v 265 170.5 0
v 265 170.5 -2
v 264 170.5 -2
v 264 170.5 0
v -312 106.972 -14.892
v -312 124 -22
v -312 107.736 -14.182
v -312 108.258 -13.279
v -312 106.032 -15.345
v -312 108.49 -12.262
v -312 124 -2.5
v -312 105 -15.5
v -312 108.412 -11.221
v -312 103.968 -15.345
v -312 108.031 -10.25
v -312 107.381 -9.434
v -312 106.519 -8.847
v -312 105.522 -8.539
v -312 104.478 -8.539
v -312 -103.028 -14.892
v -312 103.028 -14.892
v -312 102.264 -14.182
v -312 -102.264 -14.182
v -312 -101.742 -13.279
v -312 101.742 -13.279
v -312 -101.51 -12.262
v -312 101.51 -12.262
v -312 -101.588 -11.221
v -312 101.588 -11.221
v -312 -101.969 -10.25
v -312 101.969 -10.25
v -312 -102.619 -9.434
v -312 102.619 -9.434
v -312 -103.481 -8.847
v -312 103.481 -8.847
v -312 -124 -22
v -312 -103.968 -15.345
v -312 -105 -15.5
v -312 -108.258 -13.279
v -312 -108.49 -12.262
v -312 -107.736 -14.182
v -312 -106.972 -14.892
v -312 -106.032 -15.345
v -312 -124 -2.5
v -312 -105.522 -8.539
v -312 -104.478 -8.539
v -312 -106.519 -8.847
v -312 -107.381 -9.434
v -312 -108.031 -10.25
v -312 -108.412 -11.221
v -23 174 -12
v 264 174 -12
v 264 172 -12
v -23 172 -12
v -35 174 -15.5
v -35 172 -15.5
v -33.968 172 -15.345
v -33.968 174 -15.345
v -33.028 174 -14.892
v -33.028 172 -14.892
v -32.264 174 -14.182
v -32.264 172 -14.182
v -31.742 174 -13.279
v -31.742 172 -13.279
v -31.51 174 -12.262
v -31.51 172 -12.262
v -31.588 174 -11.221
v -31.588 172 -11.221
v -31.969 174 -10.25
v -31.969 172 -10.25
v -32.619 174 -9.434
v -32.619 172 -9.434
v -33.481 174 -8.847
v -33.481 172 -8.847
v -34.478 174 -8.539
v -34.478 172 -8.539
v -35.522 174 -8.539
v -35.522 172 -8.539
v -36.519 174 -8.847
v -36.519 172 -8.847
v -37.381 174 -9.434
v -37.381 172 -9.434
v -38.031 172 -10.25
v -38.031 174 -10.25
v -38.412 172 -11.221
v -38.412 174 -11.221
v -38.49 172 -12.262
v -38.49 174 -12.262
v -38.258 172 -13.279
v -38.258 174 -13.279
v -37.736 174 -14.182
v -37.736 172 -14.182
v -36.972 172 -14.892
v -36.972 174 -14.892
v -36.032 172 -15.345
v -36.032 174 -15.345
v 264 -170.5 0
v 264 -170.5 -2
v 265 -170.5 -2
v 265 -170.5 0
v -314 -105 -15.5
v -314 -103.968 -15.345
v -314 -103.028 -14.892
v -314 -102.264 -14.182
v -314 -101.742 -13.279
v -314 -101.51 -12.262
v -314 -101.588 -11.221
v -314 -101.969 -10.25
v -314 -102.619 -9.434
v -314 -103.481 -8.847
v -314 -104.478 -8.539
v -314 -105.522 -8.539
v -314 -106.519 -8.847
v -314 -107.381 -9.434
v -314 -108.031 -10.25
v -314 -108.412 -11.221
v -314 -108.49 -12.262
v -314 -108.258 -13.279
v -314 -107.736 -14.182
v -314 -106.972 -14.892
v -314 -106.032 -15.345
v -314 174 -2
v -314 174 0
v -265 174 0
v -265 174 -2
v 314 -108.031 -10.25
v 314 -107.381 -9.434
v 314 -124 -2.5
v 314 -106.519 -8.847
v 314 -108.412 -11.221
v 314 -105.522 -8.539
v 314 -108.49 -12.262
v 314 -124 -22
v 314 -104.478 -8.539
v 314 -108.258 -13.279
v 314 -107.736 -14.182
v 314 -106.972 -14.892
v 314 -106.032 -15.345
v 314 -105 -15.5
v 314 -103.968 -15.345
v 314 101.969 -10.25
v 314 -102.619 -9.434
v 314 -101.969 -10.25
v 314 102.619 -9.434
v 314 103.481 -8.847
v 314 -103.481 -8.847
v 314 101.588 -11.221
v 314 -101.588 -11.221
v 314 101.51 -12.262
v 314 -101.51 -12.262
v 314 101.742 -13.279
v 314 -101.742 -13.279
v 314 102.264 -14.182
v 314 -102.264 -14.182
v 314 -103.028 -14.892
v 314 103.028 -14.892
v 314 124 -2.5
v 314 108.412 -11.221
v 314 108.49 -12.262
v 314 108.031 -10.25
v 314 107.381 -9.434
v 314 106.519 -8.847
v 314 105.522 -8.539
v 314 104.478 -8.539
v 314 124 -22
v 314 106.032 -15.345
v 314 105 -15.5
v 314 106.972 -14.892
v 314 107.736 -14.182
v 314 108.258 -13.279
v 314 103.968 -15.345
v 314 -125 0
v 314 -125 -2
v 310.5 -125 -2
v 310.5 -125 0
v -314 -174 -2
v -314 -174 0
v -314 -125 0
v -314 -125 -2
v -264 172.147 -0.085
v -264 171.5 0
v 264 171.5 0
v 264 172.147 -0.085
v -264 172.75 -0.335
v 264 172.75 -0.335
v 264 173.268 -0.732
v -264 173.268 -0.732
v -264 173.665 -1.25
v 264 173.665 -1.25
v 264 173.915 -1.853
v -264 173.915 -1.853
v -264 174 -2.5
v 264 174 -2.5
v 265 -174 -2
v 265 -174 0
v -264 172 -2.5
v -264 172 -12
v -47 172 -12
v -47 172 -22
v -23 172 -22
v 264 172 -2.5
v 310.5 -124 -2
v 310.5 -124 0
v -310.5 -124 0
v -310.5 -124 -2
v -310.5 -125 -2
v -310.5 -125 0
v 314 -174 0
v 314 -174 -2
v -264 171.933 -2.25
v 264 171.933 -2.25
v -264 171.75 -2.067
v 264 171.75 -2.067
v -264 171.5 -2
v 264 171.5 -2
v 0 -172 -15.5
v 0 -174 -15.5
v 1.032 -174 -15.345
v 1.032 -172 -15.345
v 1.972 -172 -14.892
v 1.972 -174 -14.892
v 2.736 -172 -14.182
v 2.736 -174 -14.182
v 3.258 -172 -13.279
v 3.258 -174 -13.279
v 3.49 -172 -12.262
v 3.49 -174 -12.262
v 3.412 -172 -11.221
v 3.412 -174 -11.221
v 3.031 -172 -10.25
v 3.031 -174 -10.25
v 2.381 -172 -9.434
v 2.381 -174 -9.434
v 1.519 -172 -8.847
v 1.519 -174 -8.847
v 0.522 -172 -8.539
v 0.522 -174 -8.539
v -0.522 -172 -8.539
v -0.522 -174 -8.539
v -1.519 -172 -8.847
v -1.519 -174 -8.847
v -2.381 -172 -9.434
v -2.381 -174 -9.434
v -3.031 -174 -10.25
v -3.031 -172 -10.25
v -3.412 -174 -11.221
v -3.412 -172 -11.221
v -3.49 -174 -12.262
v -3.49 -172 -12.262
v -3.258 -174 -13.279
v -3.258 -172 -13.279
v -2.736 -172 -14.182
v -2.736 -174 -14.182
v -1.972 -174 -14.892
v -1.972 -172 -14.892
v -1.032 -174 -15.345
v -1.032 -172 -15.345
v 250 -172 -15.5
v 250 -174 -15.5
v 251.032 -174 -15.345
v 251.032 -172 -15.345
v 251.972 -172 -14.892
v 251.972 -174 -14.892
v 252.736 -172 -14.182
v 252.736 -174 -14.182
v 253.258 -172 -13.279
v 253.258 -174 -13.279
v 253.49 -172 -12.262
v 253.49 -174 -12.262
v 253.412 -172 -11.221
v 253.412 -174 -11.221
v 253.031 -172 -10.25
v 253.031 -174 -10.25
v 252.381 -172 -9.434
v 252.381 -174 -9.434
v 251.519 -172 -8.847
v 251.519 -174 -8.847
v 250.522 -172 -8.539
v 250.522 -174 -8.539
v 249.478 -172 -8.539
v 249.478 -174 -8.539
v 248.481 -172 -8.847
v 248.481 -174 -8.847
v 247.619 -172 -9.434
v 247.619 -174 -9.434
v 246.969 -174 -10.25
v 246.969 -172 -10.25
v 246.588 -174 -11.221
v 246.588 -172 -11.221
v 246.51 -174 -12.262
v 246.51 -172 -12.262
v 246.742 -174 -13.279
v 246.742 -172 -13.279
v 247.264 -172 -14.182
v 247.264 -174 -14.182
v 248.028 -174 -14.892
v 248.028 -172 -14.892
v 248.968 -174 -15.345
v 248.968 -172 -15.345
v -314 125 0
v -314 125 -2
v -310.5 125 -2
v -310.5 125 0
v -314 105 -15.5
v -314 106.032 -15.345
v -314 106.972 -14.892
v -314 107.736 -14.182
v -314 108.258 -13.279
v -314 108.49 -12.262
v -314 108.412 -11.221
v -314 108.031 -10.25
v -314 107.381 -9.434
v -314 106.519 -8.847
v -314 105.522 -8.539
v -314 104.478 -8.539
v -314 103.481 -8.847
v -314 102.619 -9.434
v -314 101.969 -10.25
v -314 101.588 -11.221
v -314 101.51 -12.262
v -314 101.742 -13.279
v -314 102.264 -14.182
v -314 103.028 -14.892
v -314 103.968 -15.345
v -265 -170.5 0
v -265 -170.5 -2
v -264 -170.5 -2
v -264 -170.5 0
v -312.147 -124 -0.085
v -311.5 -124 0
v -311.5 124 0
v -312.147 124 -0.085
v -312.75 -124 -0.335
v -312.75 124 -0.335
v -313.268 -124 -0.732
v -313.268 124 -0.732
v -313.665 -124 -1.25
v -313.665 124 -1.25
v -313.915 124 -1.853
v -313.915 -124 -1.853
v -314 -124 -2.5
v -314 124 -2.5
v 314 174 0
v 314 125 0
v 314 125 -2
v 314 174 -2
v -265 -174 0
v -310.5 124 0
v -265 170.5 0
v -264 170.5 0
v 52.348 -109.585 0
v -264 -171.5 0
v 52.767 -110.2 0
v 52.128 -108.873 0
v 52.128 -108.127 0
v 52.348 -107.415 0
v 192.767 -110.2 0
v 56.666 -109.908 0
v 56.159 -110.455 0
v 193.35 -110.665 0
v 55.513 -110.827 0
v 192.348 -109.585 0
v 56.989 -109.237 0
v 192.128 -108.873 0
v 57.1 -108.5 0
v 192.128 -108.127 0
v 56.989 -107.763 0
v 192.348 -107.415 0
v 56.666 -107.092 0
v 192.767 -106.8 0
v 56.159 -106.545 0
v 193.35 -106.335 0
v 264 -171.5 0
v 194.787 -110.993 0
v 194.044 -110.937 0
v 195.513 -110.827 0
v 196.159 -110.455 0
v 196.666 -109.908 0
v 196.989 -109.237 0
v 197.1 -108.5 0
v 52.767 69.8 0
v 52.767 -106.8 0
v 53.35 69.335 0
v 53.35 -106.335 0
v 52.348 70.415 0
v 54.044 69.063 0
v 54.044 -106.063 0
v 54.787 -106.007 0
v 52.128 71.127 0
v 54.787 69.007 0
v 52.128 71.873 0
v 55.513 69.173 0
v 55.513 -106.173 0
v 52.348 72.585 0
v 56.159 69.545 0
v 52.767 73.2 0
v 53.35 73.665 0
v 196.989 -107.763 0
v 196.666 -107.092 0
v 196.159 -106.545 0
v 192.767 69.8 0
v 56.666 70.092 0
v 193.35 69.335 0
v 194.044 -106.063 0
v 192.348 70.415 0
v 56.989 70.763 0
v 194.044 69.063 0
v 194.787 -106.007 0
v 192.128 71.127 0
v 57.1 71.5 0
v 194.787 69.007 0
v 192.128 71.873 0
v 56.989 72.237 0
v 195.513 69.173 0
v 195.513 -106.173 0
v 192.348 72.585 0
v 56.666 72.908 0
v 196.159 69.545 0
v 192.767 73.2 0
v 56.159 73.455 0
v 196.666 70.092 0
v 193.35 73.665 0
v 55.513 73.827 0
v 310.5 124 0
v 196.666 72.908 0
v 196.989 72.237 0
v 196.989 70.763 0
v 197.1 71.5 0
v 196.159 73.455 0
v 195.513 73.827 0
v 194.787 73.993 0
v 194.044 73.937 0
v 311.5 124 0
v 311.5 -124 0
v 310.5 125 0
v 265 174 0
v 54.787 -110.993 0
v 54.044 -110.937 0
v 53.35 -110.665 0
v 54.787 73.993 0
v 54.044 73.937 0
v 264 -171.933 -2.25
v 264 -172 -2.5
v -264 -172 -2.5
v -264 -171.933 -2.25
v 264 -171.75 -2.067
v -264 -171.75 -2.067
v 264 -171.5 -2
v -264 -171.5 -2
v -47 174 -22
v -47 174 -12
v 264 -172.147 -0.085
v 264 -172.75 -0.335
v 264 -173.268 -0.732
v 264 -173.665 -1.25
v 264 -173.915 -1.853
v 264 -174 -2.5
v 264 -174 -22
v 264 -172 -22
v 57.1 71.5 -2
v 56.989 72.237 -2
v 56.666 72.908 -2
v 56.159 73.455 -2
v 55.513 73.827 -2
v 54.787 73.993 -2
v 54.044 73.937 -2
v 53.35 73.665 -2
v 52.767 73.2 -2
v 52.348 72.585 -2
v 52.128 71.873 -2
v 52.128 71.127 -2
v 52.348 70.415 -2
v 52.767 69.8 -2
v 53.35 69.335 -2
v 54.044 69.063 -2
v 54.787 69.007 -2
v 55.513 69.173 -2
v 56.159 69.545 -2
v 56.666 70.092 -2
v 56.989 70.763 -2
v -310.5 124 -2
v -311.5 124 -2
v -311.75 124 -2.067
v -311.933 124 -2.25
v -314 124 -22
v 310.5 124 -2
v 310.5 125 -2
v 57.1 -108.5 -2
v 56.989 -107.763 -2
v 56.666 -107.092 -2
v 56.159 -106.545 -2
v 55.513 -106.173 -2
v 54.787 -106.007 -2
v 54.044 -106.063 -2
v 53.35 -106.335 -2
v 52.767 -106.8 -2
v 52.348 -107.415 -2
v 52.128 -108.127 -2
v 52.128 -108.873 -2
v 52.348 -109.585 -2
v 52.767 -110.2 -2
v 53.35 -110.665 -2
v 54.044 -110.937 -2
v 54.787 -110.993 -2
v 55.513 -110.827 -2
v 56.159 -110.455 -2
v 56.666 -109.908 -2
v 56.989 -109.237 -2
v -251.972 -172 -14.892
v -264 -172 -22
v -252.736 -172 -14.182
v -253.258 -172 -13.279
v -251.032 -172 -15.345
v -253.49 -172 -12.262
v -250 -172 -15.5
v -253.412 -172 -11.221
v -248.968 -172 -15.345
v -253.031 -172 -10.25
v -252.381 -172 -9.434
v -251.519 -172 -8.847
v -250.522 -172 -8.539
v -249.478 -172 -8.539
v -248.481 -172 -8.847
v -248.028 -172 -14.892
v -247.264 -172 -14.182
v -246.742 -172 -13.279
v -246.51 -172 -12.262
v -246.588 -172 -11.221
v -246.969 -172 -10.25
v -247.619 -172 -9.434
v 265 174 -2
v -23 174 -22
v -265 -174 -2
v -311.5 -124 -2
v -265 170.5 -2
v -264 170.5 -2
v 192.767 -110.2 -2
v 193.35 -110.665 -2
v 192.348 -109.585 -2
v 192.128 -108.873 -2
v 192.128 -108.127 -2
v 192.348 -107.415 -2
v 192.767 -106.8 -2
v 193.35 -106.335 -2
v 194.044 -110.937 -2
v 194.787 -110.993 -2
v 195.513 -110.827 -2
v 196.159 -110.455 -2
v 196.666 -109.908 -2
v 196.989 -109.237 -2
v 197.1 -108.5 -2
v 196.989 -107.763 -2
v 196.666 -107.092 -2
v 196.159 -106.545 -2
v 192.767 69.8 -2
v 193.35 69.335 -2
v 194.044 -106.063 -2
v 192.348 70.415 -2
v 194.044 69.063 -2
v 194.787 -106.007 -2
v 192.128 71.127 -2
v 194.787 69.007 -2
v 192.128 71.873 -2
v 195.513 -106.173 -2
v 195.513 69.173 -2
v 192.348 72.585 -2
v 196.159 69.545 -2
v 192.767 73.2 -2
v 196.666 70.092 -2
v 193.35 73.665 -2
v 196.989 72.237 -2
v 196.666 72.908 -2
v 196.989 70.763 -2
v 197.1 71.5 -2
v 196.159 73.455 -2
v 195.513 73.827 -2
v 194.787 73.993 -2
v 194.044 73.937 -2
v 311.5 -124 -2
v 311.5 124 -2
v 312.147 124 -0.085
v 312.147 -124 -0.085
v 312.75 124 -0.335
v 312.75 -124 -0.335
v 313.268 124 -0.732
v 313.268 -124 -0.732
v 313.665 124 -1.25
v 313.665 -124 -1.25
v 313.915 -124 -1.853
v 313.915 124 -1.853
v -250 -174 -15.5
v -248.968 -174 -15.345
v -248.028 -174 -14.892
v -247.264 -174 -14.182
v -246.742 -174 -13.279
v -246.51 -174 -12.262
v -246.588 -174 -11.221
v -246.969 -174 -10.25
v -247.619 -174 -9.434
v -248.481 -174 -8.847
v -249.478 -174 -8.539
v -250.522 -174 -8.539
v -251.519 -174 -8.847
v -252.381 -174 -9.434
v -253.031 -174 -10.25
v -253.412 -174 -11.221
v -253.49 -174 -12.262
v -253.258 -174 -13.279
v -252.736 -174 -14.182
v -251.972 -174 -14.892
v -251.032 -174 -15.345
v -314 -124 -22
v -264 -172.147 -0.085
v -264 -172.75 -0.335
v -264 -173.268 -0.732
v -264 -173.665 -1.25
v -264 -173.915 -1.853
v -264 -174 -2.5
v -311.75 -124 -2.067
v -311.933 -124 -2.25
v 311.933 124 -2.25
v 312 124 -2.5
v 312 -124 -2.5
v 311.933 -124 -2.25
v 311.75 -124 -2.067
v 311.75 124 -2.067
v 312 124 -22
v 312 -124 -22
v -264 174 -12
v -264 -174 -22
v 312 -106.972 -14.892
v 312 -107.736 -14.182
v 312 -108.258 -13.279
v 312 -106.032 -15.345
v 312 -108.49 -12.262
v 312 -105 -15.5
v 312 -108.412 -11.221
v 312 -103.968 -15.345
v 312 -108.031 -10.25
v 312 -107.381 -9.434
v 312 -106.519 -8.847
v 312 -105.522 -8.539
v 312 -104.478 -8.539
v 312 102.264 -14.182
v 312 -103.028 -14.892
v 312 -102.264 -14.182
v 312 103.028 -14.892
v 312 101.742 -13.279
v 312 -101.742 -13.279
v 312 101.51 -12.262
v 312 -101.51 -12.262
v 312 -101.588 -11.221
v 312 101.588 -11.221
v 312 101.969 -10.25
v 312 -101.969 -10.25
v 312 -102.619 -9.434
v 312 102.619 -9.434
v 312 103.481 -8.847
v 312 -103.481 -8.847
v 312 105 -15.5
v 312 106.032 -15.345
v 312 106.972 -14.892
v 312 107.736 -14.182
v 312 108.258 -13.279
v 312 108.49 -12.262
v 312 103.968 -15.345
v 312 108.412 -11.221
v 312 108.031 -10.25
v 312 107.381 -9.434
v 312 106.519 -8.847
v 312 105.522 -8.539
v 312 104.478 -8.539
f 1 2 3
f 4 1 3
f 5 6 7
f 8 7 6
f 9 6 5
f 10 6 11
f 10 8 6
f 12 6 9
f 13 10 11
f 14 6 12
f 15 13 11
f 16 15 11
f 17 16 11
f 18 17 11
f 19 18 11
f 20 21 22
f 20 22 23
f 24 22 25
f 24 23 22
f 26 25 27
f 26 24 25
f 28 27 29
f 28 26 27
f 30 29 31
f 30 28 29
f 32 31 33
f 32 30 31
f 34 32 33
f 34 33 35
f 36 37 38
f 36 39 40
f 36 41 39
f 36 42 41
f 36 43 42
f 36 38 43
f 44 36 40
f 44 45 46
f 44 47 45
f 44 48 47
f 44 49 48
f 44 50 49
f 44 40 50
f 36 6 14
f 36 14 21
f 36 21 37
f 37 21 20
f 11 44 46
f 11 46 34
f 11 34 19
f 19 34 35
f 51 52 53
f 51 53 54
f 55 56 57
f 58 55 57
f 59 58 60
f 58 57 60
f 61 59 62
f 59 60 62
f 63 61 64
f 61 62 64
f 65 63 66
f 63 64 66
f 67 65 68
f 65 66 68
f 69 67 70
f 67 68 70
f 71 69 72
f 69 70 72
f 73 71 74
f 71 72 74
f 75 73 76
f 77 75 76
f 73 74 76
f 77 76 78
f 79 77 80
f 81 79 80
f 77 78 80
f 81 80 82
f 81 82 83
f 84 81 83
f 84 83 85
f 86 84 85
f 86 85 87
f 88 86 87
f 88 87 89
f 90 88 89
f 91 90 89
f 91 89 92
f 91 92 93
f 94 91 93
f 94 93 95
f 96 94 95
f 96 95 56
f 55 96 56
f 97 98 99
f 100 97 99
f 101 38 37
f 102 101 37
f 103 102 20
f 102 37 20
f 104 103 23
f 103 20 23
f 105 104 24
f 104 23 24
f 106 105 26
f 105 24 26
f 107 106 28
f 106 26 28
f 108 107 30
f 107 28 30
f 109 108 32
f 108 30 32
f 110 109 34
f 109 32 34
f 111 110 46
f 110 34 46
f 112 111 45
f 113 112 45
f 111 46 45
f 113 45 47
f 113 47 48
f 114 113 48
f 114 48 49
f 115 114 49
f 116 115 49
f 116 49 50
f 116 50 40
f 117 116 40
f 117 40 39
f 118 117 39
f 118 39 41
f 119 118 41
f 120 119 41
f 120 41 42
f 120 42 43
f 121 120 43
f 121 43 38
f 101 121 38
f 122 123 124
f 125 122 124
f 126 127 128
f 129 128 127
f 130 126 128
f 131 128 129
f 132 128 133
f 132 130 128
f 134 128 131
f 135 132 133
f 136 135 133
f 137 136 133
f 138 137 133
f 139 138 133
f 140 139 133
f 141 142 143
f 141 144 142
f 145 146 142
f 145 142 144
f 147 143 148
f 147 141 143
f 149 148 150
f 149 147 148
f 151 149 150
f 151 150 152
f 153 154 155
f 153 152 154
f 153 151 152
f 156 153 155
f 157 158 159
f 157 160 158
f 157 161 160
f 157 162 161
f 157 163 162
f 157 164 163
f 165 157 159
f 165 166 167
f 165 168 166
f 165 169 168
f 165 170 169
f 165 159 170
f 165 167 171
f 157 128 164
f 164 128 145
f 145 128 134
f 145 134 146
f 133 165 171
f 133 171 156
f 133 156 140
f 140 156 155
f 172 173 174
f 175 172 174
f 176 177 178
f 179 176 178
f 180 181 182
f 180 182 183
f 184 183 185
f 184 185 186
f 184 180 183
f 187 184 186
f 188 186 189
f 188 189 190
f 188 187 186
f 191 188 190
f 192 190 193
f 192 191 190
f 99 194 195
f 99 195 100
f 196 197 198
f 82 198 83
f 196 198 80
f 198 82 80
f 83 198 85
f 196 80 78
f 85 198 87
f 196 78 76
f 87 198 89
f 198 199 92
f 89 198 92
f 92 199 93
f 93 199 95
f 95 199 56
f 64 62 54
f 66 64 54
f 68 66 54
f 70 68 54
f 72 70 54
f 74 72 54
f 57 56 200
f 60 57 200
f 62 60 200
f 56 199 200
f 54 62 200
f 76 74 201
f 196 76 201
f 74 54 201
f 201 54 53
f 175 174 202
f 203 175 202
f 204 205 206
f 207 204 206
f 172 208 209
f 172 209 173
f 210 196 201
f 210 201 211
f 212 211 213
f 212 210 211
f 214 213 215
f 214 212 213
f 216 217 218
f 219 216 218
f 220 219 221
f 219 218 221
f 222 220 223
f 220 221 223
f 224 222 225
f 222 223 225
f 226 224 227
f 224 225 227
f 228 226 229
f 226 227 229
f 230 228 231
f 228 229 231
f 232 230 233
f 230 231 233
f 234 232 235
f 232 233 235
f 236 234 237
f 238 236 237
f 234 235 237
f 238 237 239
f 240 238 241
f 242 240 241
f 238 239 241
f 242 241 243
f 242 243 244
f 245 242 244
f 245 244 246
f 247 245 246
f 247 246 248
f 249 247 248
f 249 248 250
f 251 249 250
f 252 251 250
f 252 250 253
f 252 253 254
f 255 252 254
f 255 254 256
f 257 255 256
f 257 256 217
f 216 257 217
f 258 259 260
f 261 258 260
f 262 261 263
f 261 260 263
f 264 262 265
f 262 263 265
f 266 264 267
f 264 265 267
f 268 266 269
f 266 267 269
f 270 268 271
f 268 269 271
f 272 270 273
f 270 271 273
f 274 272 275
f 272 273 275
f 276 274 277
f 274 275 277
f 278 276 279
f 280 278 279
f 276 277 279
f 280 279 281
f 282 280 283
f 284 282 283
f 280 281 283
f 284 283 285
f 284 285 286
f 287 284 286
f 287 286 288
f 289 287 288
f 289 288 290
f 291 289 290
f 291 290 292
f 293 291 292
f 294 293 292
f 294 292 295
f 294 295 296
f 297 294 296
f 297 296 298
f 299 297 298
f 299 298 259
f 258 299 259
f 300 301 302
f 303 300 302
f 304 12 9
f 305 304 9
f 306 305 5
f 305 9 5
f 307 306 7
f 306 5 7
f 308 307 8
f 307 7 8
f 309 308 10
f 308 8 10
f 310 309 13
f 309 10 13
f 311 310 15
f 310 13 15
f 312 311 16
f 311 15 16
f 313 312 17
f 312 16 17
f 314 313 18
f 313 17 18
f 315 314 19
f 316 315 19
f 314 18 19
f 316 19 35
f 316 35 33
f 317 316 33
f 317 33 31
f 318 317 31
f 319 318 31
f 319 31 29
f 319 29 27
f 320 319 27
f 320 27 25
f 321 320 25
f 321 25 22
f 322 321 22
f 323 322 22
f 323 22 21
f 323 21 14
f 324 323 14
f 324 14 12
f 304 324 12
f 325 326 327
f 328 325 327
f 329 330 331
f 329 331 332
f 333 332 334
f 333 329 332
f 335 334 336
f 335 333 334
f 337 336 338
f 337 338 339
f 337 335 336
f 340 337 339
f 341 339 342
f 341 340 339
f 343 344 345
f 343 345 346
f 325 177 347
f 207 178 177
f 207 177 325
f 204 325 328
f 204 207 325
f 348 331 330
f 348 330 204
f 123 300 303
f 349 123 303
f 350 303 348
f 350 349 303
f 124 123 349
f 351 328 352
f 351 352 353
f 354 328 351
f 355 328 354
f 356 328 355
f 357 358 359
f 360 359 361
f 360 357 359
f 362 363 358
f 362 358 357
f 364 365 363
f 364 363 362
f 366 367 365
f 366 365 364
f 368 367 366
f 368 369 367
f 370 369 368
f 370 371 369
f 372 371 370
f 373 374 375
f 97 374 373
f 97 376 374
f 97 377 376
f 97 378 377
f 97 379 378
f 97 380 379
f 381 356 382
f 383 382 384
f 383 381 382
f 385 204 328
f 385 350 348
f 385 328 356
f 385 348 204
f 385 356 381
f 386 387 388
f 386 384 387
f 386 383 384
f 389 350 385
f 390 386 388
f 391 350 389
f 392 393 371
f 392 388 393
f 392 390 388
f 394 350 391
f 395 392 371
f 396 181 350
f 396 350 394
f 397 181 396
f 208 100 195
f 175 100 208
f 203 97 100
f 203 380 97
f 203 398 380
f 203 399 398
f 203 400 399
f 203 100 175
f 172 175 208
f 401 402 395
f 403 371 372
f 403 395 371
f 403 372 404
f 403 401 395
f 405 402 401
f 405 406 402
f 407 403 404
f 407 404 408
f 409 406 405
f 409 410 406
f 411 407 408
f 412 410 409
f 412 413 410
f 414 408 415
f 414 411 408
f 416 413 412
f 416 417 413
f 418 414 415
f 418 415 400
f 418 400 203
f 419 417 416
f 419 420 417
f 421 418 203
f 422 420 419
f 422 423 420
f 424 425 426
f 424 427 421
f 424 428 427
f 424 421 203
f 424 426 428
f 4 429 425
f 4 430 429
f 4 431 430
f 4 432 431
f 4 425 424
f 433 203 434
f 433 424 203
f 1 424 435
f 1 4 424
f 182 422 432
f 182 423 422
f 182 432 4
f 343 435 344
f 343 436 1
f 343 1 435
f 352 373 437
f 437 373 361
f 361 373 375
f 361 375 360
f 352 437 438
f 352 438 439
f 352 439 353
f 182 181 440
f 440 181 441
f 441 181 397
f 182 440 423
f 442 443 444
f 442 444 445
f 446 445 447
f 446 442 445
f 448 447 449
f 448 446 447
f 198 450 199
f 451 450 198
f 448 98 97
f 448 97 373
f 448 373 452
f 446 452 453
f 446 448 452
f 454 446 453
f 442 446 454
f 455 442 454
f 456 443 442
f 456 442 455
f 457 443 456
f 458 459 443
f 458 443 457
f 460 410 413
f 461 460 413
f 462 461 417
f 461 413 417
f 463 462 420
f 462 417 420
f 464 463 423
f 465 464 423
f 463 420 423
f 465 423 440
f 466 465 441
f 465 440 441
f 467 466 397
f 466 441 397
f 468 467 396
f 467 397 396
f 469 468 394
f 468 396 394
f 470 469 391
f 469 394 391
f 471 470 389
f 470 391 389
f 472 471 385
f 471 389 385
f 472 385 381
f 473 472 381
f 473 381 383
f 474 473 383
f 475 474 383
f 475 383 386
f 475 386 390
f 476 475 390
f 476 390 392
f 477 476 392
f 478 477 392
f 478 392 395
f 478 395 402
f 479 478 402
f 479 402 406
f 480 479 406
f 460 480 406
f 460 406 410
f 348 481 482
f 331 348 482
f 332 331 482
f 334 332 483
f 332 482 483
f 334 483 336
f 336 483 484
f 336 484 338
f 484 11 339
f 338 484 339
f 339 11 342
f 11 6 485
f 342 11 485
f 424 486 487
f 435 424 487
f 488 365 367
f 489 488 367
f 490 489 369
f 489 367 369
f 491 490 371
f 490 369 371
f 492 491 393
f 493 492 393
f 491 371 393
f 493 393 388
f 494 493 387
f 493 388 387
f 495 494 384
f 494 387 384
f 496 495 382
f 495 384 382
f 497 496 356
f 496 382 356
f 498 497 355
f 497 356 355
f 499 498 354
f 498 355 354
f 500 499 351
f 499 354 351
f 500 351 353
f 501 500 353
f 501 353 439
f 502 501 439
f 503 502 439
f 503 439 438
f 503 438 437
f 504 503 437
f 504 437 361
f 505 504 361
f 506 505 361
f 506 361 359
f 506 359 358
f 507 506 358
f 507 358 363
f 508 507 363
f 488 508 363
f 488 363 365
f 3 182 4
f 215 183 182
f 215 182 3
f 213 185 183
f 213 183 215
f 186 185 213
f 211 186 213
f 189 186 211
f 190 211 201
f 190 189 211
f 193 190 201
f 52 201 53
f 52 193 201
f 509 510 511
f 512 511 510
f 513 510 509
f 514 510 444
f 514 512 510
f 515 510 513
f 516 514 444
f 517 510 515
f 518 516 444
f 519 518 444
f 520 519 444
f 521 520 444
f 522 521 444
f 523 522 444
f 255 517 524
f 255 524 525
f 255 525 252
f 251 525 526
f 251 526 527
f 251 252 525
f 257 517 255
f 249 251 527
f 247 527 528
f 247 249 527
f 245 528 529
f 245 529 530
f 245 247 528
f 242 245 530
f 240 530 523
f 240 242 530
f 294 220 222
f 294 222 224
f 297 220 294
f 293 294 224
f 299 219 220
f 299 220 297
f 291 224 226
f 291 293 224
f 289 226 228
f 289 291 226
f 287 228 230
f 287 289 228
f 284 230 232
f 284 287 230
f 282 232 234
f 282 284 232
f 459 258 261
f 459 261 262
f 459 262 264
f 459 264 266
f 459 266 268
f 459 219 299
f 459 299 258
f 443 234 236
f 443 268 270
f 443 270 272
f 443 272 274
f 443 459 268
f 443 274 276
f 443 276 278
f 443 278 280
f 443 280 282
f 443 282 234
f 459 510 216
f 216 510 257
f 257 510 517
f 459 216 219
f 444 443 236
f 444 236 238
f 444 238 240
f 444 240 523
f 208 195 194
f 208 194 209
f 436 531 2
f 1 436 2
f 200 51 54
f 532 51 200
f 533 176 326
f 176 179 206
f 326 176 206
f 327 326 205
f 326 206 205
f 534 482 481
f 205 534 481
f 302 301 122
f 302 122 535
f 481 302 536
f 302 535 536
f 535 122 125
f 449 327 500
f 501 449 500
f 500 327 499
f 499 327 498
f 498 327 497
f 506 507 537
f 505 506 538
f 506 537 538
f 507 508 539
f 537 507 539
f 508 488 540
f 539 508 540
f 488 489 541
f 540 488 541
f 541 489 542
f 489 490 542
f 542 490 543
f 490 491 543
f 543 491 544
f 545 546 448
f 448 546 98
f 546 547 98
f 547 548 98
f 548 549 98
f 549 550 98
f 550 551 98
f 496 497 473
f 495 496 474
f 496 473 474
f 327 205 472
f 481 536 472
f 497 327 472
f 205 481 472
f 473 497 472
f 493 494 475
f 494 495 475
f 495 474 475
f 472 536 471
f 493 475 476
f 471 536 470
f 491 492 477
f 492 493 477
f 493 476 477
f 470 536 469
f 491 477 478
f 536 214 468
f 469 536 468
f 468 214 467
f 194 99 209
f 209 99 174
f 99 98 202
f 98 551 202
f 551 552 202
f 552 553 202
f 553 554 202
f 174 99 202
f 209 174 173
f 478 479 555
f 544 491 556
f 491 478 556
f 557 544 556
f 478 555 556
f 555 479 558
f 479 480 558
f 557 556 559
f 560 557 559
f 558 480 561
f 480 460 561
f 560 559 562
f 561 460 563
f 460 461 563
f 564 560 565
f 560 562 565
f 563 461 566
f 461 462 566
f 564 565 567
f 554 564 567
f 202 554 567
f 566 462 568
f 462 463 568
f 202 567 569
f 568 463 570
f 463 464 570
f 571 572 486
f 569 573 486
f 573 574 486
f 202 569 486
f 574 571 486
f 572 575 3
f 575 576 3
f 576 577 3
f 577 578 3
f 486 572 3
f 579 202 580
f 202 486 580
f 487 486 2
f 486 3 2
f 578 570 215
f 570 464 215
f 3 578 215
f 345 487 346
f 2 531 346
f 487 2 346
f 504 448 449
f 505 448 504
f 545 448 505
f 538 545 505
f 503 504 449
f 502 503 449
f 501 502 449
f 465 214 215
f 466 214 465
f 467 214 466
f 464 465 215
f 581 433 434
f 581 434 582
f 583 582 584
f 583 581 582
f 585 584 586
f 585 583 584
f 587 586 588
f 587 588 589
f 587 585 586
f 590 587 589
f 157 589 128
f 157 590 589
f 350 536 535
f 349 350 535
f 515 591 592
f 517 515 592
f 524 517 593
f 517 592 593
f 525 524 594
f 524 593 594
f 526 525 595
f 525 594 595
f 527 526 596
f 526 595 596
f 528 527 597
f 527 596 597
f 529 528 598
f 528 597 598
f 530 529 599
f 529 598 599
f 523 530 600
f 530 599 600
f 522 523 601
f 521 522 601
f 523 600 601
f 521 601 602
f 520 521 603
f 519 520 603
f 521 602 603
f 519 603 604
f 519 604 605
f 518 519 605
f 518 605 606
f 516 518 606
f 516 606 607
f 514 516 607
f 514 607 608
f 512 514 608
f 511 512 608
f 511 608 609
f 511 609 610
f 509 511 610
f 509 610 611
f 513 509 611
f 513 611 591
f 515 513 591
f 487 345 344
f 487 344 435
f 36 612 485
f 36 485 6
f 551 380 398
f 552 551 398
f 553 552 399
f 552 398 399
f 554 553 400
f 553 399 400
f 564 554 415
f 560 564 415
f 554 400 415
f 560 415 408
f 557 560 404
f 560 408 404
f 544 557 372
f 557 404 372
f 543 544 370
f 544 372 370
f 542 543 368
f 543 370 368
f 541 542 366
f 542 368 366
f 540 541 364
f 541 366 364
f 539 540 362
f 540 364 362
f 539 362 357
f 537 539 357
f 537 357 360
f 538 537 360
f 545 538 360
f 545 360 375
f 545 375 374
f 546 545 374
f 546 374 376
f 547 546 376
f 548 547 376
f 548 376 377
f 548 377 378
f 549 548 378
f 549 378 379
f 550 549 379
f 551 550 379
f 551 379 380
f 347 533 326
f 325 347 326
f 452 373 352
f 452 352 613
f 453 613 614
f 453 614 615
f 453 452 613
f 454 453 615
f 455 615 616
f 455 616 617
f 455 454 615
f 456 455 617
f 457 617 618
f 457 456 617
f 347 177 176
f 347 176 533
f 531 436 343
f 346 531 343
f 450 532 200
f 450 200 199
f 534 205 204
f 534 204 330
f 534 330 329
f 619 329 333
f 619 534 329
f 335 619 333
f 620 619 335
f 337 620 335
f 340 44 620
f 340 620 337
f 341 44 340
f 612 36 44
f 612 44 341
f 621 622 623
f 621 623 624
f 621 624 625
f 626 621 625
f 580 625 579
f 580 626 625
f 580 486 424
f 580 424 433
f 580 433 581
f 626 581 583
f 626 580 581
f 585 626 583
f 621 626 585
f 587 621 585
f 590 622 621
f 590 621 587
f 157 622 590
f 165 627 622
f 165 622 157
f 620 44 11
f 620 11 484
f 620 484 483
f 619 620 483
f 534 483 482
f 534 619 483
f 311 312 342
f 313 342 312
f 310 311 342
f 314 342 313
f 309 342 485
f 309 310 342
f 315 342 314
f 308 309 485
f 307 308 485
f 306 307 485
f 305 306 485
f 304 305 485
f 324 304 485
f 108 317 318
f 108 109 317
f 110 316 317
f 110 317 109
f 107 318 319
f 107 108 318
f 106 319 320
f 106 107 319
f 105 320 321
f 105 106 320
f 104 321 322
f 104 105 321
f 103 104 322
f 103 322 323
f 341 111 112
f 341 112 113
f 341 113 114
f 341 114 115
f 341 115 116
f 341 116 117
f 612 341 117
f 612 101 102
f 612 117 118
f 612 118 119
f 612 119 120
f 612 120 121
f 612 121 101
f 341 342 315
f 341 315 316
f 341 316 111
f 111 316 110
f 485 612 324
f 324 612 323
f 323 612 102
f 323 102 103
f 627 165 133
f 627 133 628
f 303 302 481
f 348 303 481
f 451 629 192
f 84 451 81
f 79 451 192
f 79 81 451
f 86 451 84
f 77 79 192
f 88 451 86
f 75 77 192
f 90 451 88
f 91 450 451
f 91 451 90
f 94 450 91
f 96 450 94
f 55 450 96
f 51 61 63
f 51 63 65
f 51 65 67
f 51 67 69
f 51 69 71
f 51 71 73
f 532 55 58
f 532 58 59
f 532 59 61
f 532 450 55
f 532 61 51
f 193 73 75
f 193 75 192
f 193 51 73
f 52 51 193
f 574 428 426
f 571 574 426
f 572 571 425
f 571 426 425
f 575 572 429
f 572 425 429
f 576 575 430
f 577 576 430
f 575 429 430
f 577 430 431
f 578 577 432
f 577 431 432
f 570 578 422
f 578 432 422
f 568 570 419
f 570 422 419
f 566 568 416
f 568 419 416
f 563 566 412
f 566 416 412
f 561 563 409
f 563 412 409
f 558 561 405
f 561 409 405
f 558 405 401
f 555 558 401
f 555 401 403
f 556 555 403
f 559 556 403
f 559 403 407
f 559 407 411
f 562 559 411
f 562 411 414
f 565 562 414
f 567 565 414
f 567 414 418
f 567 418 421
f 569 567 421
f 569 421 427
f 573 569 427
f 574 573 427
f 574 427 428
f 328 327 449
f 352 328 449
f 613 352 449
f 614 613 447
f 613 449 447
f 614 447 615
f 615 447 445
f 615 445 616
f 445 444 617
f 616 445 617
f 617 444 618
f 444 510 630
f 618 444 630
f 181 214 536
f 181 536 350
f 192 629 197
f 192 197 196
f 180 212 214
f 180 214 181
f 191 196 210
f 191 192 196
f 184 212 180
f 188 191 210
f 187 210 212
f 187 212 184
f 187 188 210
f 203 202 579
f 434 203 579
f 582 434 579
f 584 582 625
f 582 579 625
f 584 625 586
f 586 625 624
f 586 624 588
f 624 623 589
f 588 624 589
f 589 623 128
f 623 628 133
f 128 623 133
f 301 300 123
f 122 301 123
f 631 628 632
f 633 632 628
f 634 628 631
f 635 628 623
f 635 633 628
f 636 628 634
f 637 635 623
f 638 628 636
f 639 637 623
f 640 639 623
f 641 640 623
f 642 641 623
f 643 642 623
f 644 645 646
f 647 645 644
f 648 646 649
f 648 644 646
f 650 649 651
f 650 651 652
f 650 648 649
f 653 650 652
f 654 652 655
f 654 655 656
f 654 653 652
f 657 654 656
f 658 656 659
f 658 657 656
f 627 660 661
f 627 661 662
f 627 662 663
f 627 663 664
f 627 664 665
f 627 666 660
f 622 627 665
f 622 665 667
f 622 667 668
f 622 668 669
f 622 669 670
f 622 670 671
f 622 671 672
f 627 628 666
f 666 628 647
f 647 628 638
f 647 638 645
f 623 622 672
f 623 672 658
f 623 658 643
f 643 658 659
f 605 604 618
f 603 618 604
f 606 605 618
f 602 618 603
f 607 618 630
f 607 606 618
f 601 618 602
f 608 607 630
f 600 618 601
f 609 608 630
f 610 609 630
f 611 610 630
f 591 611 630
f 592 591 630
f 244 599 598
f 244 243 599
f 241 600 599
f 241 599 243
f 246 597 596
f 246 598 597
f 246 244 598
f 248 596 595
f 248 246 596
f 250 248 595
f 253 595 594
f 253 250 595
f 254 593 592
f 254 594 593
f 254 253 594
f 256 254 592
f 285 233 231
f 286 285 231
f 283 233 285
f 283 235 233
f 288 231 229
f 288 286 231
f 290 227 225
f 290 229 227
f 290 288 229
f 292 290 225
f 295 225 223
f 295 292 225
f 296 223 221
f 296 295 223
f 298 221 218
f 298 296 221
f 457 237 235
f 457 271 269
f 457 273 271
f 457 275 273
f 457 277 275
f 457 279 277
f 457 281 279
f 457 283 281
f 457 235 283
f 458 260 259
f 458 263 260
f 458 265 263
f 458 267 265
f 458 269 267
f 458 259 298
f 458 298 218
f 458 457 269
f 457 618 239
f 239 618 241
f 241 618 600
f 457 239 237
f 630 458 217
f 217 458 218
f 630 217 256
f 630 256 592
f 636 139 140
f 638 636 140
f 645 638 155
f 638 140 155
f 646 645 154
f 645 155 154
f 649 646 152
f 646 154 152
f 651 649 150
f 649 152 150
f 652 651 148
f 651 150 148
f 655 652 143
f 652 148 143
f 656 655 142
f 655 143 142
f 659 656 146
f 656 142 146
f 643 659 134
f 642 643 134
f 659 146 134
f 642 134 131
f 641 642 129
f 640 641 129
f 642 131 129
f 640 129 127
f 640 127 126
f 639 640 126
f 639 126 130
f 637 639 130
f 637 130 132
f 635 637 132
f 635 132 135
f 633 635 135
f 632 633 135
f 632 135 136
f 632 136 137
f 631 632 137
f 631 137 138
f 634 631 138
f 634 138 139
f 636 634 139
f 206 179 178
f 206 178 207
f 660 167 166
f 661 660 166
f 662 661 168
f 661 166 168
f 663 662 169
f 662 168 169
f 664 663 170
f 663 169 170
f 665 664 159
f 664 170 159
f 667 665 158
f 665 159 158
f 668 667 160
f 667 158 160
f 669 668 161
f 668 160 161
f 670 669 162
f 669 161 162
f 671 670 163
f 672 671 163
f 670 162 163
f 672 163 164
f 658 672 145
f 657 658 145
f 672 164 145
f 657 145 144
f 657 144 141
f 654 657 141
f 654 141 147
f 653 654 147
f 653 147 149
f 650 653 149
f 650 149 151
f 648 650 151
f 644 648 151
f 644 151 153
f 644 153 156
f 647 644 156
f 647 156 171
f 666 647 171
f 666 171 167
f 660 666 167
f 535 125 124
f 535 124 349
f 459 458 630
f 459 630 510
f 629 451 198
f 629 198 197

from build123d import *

# Parameters (mm, degrees)
SKETCH_1_W                        = 628
SKETCH_1_H                        = 348
SM_BASE_FLANGE_1_DEPTH            = 2
SM_EDGE_FLANGE_1_STRIP_W          = 9
SM_EDGE_FLANGE_1_STRIP_H          = 2
SM_EDGE_FLANGE_1_STRIP_CUT_DEPTH  = 248
SM_EDGE_FLANGE_1_RELIEF_W         = 10
SM_EDGE_FLANGE_1_RELIEF_H         = 1
SM_EDGE_FLANGE_1_RELIEF_CUT_DEPTH = 2
SM_EDGE_FLANGE_1_DEPTH            = 248
SM_EDGE_FLANGE_2_STRIP_W          = 9
SM_EDGE_FLANGE_2_STRIP_H          = 2
SM_EDGE_FLANGE_2_STRIP_CUT_DEPTH  = 528
SM_EDGE_FLANGE_2_RELIEF_W         = 10
SM_EDGE_FLANGE_2_RELIEF_H         = 1
SM_EDGE_FLANGE_2_RELIEF_CUT_DEPTH = 2
SM_EDGE_FLANGE_2_DEPTH            = 528
SM_EDGE_FLANGE_2_FLAT_DEPTH       = 2
SM_EDGE_FLANGE_3_STRIP_W          = 9
SM_EDGE_FLANGE_3_STRIP_H          = 2
SM_EDGE_FLANGE_3_STRIP_CUT_DEPTH  = 248
SM_EDGE_FLANGE_3_RELIEF_W         = 10
SM_EDGE_FLANGE_3_RELIEF_H         = 1
SM_EDGE_FLANGE_3_RELIEF_CUT_DEPTH = 2
SM_EDGE_FLANGE_3_DEPTH            = 248
SM_EDGE_FLANGE_4_STRIP_W          = 9
SM_EDGE_FLANGE_4_STRIP_H          = 2
SM_EDGE_FLANGE_4_STRIP_CUT_DEPTH  = 528
SM_EDGE_FLANGE_4_RELIEF_W         = 10
SM_EDGE_FLANGE_4_RELIEF_H         = 1
SM_EDGE_FLANGE_4_RELIEF_CUT_DEPTH = 2
SM_EDGE_FLANGE_4_DEPTH            = 528
SKETCH_15_R                       = 3.5
CUT_EXTRUDE_1_DEPTH               = 653.030674125
CUT_EXTRUDE_2_REACH               = 469.756
SKETCH_16_R                       = 3.5
HOLE_WIZARD_M6_1_D                = 5
HOLE_WIZARD_M6_1_DEPTH            = 15
HOLE_WIZARD_M6_1_TIP              = 1.502151548
CUT_EXTRUDE_3_REACH               = 471.238
SKETCH_20_R                       = 3.5


# Sheet-metal steps are written as plain solids
with BuildPart() as part:
    # Sketch 1 → 基体-法兰1 (new body)
    with BuildSketch(Plane.XY):
        Rectangle(SKETCH_1_W, SKETCH_1_H)
    extrude(amount=-SM_BASE_FLANGE_1_DEPTH)

    # 边线-法兰1 strip (across the edge) → 边线-法兰1 strip cut (cut)
    with BuildSketch(Plane(origin=(314, 124, -2), x_dir=(-1, 0, 0), z_dir=(0, -1, 0))):
        with Locations((-2, -1)):
            Rectangle(SM_EDGE_FLANGE_1_STRIP_W, SM_EDGE_FLANGE_1_STRIP_H)
    extrude(amount=SM_EDGE_FLANGE_1_STRIP_CUT_DEPTH, mode=Mode.SUBTRACT)

    # 边线-法兰1 relief (on the sheet) → 边线-法兰1 relief cut (cut)
    with BuildSketch(Plane(origin=(311.5, 124, -2), x_dir=(-1, 0, 0), z_dir=(0, 0, -1))):
        with Locations((-4, 0.5)):
            Rectangle(SM_EDGE_FLANGE_1_RELIEF_W, SM_EDGE_FLANGE_1_RELIEF_H)
        with Locations((-4, -248.5)):
            Rectangle(SM_EDGE_FLANGE_1_RELIEF_W, SM_EDGE_FLANGE_1_RELIEF_H)
    extrude(amount=-SM_EDGE_FLANGE_1_RELIEF_CUT_DEPTH, mode=Mode.SUBTRACT)

    # 边线-法兰1 section (across the edge) → 边线-法兰1 (add)
    with BuildSketch(Plane(origin=(314, 124, -2), x_dir=(-1, 0, 0), z_dir=(0, -1, 0))):
        with BuildLine():
            Line((0, 0.5), (0, 20))
            Line((0, 20), (2, 20))
            Line((2, 20), (2, 0.5))
            ThreePointArc((2, 0.5), (2.146446609, 0.146446609), (2.5, 0))
            Line((2.5, 0), (2.5, -2))
            ThreePointArc((2.5, -2), (0.732233047, -1.267766953), (0, 0.5))
        make_face()
    extrude(amount=SM_EDGE_FLANGE_1_DEPTH)

    # 边线-法兰2 strip (across the edge) → 边线-法兰2 strip cut (cut)
    with BuildSketch(Plane(origin=(-264, 174, -2), x_dir=(0, -1, 0), z_dir=(1, 0, 0))):
        with Locations((-2, -1)):
            Rectangle(SM_EDGE_FLANGE_2_STRIP_W, SM_EDGE_FLANGE_2_STRIP_H)
    extrude(amount=SM_EDGE_FLANGE_2_STRIP_CUT_DEPTH, mode=Mode.SUBTRACT)

    # 边线-法兰2 relief (on the sheet) → 边线-法兰2 relief cut (cut)
    with BuildSketch(Plane(origin=(-264, 171.5, -2), x_dir=(0, -1, 0), z_dir=(0, 0, -1))):
        with Locations((-4, 0.5)):
            Rectangle(SM_EDGE_FLANGE_2_RELIEF_W, SM_EDGE_FLANGE_2_RELIEF_H)
        with Locations((-4, -528.5)):
            Rectangle(SM_EDGE_FLANGE_2_RELIEF_W, SM_EDGE_FLANGE_2_RELIEF_H)
    extrude(amount=-SM_EDGE_FLANGE_2_RELIEF_CUT_DEPTH, mode=Mode.SUBTRACT)

    # 边线-法兰2 bend section (across the edge) → 边线-法兰2 (add)
    with BuildSketch(Plane(origin=(-264, 174, -2), x_dir=(0, -1, 0), z_dir=(1, 0, 0))):
        with BuildLine():
            Line((0, 0.5), (2, 0.5))
            ThreePointArc((2, 0.5), (2.146446609, 0.146446609), (2.5, 0))
            Line((2.5, 0), (2.5, -2))
            ThreePointArc((2.5, -2), (0.732233047, -1.267766953), (0, 0.5))
        make_face()
    extrude(amount=SM_EDGE_FLANGE_2_DEPTH)

    # 边线-法兰2 profile (on flange) → 边线-法兰2 flat (add)
    with BuildSketch(Plane(origin=(0, 174, -2), x_dir=(1, 0, 0), z_dir=(0, 1, 0))):
        Polygon((264, 0.5), (264, 10), (-23, 10), (-23, 20), (-47, 20), (-47, 10), (-264, 10), (-264, 0.5), align=None)
    extrude(amount=-SM_EDGE_FLANGE_2_FLAT_DEPTH)

    # 边线-法兰3 strip (across the edge) → 边线-法兰3 strip cut (cut)
    with BuildSketch(Plane(origin=(-314, -124, -2), x_dir=(1, 0, 0), z_dir=(0, 1, 0))):
        with Locations((-2, -1)):
            Rectangle(SM_EDGE_FLANGE_3_STRIP_W, SM_EDGE_FLANGE_3_STRIP_H)
    extrude(amount=SM_EDGE_FLANGE_3_STRIP_CUT_DEPTH, mode=Mode.SUBTRACT)

    # 边线-法兰3 relief (on the sheet) → 边线-法兰3 relief cut (cut)
    with BuildSketch(Plane(origin=(-311.5, -124, -2), x_dir=(1, 0, 0), z_dir=(0, 0, -1))):
        with Locations((-4, 0.5)):
            Rectangle(SM_EDGE_FLANGE_3_RELIEF_W, SM_EDGE_FLANGE_3_RELIEF_H)
        with Locations((-4, -248.5)):
            Rectangle(SM_EDGE_FLANGE_3_RELIEF_W, SM_EDGE_FLANGE_3_RELIEF_H)
    extrude(amount=-SM_EDGE_FLANGE_3_RELIEF_CUT_DEPTH, mode=Mode.SUBTRACT)

    # 边线-法兰3 section (across the edge) → 边线-法兰3 (add)
    with BuildSketch(Plane(origin=(-314, -124, -2), x_dir=(1, 0, 0), z_dir=(0, 1, 0))):
        with BuildLine():
            Line((0, 0.5), (0, 20))
            Line((0, 20), (2, 20))
            Line((2, 20), (2, 0.5))
            ThreePointArc((2, 0.5), (2.146446609, 0.146446609), (2.5, 0))
            Line((2.5, 0), (2.5, -2))
            ThreePointArc((2.5, -2), (0.732233047, -1.267766953), (0, 0.5))
        make_face()
    extrude(amount=SM_EDGE_FLANGE_3_DEPTH)

    # 边线-法兰4 strip (across the edge) → 边线-法兰4 strip cut (cut)
    with BuildSketch(Plane(origin=(264, -174, -2), x_dir=(0, 1, 0), z_dir=(-1, 0, 0))):
        with Locations((-2, -1)):
            Rectangle(SM_EDGE_FLANGE_4_STRIP_W, SM_EDGE_FLANGE_4_STRIP_H)
    extrude(amount=SM_EDGE_FLANGE_4_STRIP_CUT_DEPTH, mode=Mode.SUBTRACT)

    # 边线-法兰4 relief (on the sheet) → 边线-法兰4 relief cut (cut)
    with BuildSketch(Plane(origin=(264, -171.5, -2), x_dir=(0, 1, 0), z_dir=(0, 0, -1))):
        with Locations((-4, 0.5)):
            Rectangle(SM_EDGE_FLANGE_4_RELIEF_W, SM_EDGE_FLANGE_4_RELIEF_H)
        with Locations((-4, -528.5)):
            Rectangle(SM_EDGE_FLANGE_4_RELIEF_W, SM_EDGE_FLANGE_4_RELIEF_H)
    extrude(amount=-SM_EDGE_FLANGE_4_RELIEF_CUT_DEPTH, mode=Mode.SUBTRACT)

    # 边线-法兰4 section (across the edge) → 边线-法兰4 (add)
    with BuildSketch(Plane(origin=(264, -174, -2), x_dir=(0, 1, 0), z_dir=(-1, 0, 0))):
        with BuildLine():
            Line((0, 0.5), (0, 20))
            Line((0, 20), (2, 20))
            Line((2, 20), (2, 0.5))
            ThreePointArc((2, 0.5), (2.146446609, 0.146446609), (2.5, 0))
            Line((2.5, 0), (2.5, -2))
            ThreePointArc((2.5, -2), (0.732233047, -1.267766953), (0, 0.5))
        make_face()
    extrude(amount=SM_EDGE_FLANGE_4_DEPTH)

    # 草图15 → 切除-拉伸1 (cut, through all)
    with BuildSketch(Plane(origin=(314, 0, 0), x_dir=(0, 0, -1), z_dir=(1, 0, 0))):
        with Locations((12, -105)):
            Circle(SKETCH_15_R)
        with Locations((12, 105)):
            Circle(SKETCH_15_R)
    extrude(amount=-CUT_EXTRUDE_1_DEPTH, mode=Mode.SUBTRACT)

    # 草图16 → 切除-拉伸2 (cut, up to next)
    with BuildSketch(Plane.XZ.offset(-172), mode=Mode.PRIVATE) as cut_extrude_2_sk1:
        with Locations(Location((-35, -12, 0), (0, 0, 270))):
            Circle(SKETCH_16_R)
    cut_extrude_2_tool1 = extrude(cut_extrude_2_sk1.sketch, amount=-CUT_EXTRUDE_2_REACH, mode=Mode.PRIVATE) & part.part
    add(cut_extrude_2_tool1.solids().sort_by_distance((-35, 172, -12))[0], mode=Mode.SUBTRACT)

    # M6 螺纹孔1
    with Locations(Plane(origin=(0, 0, -2), x_dir=(-1, 0, 0), z_dir=(0, 0, -1))):
        with Locations((-194.6, 71.5), (-54.6, 71.5), (-54.6, -108.5), (-194.6, -108.5)):
            Hole(HOLE_WIZARD_M6_1_D / 2, depth=HOLE_WIZARD_M6_1_DEPTH)
            with Locations((0, 0, -(HOLE_WIZARD_M6_1_DEPTH + HOLE_WIZARD_M6_1_TIP / 2))):  # 118° drill point
                Cone(0, HOLE_WIZARD_M6_1_D / 2, HOLE_WIZARD_M6_1_TIP, mode=Mode.SUBTRACT)

    # 草图20 → 切除-拉伸3 (cut, up to next)
    with BuildSketch(Plane.XZ.offset(174), mode=Mode.PRIVATE) as cut_extrude_3_sk1:
        with Locations(Location((0, -12, 0), (0, 0, 270))):
            Circle(SKETCH_20_R)
    cut_extrude_3_tool1 = extrude(cut_extrude_3_sk1.sketch, amount=-CUT_EXTRUDE_3_REACH, mode=Mode.PRIVATE) & part.part
    # 草图20 → 切除-拉伸3 (cut, up to next)
    with BuildSketch(Plane.XZ.offset(174), mode=Mode.PRIVATE) as cut_extrude_3_sk2:
        with Locations(Location((-250, -12, 0), (0, 0, 270))):
            Circle(SKETCH_20_R)
    cut_extrude_3_tool2 = extrude(cut_extrude_3_sk2.sketch, amount=-CUT_EXTRUDE_3_REACH, mode=Mode.PRIVATE) & part.part
    # 草图20 → 切除-拉伸3 (cut, up to next)
    with BuildSketch(Plane.XZ.offset(174), mode=Mode.PRIVATE) as cut_extrude_3_sk3:
        with Locations(Location((250, -12, 0), (0, 0, 270))):
            Circle(SKETCH_20_R)
    cut_extrude_3_tool3 = extrude(cut_extrude_3_sk3.sketch, amount=-CUT_EXTRUDE_3_REACH, mode=Mode.PRIVATE) & part.part
    add(cut_extrude_3_tool1.solids().sort_by_distance((0, -174, -12))[0], mode=Mode.SUBTRACT)
    add(cut_extrude_3_tool2.solids().sort_by_distance((-250, -174, -12))[0], mode=Mode.SUBTRACT)
    add(cut_extrude_3_tool3.solids().sort_by_distance((250, -174, -12))[0], mode=Mode.SUBTRACT)


solid = part.part
